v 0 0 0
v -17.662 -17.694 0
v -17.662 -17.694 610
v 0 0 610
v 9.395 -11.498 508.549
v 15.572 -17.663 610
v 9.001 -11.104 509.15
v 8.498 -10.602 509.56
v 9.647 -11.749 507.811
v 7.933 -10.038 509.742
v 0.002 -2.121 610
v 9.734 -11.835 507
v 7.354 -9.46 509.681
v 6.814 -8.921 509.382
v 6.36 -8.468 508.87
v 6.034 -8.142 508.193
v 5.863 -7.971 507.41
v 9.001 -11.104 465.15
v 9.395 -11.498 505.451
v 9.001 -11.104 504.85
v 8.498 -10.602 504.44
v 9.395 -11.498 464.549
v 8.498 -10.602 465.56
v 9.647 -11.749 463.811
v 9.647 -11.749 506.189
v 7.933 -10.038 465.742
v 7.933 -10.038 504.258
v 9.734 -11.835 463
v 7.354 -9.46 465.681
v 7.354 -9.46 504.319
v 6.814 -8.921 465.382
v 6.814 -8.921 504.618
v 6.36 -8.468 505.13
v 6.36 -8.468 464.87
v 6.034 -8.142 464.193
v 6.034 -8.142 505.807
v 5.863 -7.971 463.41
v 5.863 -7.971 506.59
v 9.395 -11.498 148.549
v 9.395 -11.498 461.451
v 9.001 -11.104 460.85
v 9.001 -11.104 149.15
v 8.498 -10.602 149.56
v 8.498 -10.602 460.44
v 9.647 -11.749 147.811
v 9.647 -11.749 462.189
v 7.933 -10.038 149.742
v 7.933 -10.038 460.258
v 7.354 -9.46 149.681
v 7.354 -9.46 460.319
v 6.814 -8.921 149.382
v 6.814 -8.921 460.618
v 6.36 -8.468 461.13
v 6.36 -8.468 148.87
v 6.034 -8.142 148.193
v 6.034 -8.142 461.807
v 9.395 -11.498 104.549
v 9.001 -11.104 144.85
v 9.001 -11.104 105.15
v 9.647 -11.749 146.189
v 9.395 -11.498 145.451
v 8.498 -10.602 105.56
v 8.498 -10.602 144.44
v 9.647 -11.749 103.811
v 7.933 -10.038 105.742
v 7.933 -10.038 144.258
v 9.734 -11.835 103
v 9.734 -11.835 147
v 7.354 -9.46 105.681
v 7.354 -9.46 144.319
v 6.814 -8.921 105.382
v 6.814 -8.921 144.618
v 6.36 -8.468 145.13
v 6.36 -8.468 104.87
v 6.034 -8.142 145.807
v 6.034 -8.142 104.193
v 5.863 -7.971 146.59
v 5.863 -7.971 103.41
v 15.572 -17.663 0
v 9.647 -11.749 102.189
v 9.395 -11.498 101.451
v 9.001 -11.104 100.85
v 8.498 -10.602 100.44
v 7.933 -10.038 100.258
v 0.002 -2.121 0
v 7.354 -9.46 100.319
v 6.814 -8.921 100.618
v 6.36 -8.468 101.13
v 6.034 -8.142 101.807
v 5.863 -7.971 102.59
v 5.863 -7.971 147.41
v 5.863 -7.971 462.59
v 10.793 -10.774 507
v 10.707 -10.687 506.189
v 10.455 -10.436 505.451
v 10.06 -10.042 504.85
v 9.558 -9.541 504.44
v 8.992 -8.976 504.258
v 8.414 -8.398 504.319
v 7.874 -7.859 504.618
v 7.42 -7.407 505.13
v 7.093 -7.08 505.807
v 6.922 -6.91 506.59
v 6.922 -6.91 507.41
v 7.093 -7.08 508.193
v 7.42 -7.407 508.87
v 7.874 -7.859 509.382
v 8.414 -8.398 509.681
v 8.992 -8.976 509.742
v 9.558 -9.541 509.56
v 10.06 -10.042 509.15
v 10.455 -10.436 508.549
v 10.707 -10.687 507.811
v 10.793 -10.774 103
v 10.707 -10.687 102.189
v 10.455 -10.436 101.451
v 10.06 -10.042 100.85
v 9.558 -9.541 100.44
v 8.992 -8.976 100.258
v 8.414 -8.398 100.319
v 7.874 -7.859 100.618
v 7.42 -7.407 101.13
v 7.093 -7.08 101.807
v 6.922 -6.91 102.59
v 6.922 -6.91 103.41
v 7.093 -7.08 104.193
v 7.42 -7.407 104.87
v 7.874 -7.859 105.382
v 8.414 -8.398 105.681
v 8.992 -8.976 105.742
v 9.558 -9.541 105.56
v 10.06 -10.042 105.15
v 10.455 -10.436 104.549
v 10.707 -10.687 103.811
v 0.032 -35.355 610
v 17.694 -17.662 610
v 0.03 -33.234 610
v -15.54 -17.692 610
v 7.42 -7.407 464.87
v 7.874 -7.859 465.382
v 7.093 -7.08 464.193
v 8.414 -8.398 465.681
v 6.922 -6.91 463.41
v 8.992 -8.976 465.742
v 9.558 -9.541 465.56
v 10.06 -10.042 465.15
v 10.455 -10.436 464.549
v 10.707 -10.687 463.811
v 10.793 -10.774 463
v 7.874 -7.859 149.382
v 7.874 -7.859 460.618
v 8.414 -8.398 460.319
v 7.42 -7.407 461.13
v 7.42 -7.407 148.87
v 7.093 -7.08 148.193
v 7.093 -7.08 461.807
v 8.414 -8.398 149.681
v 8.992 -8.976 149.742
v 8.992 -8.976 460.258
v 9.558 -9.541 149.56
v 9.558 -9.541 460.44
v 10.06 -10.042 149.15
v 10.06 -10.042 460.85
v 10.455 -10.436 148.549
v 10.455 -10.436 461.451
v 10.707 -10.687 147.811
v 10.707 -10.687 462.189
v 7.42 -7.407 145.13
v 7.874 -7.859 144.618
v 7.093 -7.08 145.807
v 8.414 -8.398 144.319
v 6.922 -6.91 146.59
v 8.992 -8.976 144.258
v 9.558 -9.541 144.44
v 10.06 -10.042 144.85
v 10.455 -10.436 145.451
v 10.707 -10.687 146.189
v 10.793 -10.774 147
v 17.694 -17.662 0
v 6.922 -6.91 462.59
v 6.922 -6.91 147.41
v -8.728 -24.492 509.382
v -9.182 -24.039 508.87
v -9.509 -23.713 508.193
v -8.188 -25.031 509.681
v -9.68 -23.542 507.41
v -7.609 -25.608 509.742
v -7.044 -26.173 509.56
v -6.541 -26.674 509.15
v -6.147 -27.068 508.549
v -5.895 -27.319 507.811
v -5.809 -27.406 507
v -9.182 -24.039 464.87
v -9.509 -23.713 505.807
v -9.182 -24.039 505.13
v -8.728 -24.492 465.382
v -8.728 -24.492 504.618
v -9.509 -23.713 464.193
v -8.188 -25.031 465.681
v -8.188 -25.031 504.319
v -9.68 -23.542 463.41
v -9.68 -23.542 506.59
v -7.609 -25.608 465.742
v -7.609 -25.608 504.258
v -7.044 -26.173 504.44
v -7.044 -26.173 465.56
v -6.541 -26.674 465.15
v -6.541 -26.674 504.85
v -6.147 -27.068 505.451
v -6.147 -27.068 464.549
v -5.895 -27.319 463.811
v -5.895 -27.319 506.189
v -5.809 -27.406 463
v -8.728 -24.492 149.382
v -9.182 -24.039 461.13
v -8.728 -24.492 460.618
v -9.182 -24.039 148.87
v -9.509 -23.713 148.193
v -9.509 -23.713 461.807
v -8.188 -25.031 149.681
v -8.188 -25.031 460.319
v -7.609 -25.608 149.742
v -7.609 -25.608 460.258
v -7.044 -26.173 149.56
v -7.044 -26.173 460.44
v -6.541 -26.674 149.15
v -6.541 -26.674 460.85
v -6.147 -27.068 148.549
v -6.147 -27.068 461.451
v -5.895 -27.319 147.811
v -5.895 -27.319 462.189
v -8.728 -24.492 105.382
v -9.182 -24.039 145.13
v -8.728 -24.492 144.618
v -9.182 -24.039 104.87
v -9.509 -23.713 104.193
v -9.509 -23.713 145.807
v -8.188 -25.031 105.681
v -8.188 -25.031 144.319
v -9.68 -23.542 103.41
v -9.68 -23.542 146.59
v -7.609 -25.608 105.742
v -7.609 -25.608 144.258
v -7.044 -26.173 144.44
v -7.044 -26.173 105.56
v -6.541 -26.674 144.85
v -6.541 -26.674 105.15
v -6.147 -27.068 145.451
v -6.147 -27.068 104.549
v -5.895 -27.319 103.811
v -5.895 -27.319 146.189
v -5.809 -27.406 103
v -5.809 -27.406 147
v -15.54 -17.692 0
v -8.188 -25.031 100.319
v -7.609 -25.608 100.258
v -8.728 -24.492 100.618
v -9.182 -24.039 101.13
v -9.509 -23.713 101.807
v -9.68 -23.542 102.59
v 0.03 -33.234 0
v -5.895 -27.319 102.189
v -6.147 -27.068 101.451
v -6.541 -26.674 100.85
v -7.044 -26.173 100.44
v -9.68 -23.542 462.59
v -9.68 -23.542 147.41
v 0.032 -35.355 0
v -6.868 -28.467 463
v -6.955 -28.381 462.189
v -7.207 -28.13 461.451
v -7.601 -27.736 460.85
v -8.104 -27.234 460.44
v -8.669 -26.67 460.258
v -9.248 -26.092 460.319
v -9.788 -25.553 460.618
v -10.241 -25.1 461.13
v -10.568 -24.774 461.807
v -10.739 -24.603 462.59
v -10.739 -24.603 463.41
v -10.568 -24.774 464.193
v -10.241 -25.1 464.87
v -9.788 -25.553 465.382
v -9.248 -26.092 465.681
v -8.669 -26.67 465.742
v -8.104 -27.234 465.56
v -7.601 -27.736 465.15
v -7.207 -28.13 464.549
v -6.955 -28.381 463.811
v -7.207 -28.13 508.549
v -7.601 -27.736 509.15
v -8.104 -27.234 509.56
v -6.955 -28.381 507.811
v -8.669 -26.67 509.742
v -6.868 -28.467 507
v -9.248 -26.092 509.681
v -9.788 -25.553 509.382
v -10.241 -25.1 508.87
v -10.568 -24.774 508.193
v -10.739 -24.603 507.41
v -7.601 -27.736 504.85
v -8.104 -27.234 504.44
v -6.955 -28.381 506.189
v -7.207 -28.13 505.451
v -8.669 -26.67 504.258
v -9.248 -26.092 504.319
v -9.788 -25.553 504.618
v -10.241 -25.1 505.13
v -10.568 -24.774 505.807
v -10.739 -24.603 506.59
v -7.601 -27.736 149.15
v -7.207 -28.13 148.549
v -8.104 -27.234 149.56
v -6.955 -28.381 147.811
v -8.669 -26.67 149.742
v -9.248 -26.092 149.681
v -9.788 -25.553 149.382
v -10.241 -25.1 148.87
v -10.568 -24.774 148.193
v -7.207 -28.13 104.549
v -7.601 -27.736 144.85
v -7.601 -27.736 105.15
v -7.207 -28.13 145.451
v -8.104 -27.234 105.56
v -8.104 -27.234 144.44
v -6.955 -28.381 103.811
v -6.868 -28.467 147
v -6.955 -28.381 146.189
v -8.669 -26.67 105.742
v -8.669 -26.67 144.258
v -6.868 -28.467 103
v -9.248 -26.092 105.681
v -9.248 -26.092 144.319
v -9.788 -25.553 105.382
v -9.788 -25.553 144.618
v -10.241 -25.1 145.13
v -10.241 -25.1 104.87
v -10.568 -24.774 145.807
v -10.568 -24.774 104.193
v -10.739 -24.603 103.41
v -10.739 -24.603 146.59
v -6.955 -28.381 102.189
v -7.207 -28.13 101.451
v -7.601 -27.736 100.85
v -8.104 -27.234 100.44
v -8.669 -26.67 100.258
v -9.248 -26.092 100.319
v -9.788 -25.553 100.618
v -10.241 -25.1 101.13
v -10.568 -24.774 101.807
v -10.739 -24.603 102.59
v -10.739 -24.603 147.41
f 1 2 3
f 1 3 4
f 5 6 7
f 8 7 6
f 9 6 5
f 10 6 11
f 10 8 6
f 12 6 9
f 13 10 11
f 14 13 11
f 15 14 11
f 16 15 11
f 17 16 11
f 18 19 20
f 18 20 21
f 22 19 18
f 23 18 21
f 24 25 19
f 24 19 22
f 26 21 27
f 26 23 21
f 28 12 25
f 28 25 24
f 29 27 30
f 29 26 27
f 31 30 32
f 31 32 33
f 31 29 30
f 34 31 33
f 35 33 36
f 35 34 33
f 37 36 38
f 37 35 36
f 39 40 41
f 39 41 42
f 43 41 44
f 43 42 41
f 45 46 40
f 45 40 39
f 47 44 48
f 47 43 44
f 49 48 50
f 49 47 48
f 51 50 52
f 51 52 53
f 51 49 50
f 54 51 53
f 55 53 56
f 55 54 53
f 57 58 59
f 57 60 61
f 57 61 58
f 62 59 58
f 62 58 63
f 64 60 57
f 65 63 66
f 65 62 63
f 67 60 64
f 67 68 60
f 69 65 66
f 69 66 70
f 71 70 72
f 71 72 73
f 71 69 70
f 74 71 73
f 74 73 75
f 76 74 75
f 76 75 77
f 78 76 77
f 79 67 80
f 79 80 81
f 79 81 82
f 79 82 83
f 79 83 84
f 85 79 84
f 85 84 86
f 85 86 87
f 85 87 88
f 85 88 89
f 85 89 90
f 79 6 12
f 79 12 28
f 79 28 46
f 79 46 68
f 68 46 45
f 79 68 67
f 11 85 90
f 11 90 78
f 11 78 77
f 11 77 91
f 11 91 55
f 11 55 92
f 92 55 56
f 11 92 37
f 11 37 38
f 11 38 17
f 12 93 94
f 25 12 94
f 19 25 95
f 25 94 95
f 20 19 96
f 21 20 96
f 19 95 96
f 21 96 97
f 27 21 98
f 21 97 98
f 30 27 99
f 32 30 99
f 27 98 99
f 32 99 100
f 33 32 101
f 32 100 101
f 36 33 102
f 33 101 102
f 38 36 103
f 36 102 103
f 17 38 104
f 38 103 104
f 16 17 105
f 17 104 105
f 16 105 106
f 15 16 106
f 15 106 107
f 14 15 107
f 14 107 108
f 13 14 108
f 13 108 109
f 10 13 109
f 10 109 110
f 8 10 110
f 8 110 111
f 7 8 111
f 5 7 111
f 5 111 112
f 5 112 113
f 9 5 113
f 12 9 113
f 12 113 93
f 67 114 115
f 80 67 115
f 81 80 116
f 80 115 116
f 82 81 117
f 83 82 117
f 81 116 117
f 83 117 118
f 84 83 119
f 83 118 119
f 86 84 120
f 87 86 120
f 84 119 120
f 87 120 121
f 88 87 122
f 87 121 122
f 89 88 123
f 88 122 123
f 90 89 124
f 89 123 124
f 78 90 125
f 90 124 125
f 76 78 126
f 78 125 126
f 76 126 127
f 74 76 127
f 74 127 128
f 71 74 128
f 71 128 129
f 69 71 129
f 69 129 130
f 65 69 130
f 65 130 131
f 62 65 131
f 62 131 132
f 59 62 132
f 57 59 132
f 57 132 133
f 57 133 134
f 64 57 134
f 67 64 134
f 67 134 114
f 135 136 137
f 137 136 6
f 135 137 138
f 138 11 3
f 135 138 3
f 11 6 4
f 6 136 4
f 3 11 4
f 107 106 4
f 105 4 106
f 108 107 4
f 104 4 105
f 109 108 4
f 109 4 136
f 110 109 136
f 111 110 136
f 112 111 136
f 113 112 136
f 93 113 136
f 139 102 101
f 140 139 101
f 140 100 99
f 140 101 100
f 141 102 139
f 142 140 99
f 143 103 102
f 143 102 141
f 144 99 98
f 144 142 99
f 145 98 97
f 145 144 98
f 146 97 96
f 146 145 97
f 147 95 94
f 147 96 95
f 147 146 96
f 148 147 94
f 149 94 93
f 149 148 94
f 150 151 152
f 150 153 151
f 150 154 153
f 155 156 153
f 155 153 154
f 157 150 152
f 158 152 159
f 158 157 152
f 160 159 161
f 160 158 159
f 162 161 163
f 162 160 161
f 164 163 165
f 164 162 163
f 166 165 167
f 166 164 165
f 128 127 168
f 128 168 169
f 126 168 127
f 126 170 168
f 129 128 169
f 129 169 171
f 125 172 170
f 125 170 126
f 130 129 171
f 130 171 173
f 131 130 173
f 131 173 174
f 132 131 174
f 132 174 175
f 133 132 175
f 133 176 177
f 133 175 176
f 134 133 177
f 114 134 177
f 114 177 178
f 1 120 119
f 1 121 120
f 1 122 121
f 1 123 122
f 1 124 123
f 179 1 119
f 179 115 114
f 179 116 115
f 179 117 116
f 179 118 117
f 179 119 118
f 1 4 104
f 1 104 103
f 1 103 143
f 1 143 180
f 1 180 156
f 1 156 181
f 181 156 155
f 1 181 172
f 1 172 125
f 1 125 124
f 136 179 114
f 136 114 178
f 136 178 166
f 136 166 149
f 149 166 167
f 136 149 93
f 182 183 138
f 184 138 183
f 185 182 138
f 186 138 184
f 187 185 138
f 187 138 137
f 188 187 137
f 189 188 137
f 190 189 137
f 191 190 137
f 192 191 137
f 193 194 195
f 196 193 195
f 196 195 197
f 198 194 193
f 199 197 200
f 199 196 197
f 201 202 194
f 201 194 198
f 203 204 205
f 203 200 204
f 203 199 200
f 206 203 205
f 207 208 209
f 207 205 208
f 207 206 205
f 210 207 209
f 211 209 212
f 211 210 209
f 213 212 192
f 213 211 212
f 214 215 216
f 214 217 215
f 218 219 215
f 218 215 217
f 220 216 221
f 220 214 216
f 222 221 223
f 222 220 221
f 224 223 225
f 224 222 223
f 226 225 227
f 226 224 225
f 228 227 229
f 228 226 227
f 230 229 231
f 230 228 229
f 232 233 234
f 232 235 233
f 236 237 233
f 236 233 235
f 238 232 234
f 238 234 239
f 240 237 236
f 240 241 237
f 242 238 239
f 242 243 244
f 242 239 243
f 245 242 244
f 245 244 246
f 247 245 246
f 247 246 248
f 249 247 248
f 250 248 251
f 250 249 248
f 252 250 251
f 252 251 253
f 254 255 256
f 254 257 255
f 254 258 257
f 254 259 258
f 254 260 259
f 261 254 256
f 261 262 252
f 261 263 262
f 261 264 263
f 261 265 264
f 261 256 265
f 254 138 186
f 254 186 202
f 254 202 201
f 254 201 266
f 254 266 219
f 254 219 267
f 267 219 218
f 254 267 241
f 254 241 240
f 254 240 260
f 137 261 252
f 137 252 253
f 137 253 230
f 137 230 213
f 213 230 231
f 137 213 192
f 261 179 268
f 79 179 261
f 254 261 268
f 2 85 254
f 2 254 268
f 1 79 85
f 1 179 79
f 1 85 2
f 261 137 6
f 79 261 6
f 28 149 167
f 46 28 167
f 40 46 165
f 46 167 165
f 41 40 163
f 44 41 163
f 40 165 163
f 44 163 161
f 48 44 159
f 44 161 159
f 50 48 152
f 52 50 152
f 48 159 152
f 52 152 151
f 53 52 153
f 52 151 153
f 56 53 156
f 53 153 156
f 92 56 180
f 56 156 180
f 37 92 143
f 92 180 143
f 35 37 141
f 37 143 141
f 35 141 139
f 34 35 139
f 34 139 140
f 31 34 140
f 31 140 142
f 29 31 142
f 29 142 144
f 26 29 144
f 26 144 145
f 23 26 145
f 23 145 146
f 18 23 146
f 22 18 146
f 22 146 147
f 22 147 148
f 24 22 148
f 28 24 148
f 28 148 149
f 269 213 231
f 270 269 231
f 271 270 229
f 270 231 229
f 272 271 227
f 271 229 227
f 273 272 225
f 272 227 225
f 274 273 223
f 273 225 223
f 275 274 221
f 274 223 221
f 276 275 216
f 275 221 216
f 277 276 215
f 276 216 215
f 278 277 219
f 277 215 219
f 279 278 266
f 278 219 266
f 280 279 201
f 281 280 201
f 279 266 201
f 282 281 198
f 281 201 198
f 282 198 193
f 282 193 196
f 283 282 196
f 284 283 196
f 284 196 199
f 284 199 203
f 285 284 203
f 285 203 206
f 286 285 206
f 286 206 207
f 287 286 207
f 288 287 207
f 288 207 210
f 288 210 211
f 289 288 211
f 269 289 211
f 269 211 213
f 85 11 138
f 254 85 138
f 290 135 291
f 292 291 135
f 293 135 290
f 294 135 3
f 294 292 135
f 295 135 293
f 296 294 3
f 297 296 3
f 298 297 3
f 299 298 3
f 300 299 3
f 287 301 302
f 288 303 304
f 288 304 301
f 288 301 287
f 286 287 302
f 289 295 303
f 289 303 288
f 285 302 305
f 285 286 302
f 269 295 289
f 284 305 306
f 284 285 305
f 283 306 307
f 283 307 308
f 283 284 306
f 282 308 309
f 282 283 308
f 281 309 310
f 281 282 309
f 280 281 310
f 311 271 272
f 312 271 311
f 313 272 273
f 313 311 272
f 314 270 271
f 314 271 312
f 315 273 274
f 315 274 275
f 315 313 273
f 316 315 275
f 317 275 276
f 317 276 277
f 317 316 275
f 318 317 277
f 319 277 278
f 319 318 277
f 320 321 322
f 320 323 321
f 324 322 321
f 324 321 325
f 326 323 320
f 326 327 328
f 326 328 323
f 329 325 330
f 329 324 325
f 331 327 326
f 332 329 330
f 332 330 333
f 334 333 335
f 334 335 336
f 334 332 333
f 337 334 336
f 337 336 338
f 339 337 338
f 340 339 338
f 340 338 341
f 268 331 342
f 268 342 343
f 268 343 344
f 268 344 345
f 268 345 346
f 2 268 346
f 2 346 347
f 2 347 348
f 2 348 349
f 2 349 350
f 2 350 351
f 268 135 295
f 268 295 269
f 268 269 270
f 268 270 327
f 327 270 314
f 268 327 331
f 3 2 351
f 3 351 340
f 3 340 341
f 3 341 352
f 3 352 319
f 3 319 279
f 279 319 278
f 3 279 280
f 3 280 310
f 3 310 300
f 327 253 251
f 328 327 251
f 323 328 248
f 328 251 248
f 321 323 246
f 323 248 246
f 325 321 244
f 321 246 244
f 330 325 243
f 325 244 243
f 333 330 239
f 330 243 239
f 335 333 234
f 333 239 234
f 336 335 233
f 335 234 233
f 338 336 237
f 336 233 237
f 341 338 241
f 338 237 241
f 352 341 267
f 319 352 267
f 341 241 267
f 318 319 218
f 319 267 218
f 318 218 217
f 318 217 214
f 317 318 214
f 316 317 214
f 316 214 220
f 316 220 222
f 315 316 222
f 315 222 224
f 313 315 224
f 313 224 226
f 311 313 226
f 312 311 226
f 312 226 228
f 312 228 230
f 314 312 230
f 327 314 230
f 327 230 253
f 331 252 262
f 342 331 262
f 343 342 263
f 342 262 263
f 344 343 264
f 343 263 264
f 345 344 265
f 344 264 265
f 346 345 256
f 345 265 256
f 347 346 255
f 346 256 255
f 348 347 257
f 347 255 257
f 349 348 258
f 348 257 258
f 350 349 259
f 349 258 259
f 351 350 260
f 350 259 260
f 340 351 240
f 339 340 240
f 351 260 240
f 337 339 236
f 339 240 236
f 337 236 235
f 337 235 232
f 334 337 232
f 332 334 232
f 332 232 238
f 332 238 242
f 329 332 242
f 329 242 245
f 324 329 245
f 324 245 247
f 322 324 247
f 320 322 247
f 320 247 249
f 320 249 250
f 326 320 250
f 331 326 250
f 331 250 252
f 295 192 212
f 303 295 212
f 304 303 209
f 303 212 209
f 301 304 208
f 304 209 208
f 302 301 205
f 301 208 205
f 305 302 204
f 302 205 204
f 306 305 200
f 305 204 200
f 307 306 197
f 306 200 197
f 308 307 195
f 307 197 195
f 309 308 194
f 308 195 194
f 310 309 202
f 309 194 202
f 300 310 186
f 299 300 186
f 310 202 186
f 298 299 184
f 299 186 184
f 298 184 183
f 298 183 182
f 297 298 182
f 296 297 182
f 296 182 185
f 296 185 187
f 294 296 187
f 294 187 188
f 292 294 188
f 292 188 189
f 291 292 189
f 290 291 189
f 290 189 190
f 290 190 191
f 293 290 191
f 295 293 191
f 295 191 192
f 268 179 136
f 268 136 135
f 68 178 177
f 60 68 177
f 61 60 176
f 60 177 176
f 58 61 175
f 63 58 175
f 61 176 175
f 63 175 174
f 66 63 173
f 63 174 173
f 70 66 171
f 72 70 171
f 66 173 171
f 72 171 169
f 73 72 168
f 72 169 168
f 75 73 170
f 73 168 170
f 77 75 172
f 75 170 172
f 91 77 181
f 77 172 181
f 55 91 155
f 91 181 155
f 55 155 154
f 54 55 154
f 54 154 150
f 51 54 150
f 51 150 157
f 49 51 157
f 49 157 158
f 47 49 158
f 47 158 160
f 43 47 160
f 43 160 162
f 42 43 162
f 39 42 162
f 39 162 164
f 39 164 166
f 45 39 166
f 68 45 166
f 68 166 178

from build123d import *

# Parameters (mm, degrees)
EXTRUDE_1_DEPTH     = 610
SKETCH_2_R          = 2.75
CUT_EXTRUDE_1_DEPTH = 38.499979182


with BuildPart() as part:
    # 草圖1 → 填料-伸長1 (new body)
    with BuildSketch(Plane.XY):
        Polygon((0, 0), (17.69379362, -17.661530719), (0.032262901, -35.355324339), (-17.661530719, -17.69379362), align=None)
        Polygon((0.001935774, -2.12131946), (-15.540211259, -17.691857846), (0.030327127, -33.234004879), (15.57247416, -17.663466493), align=None, mode=Mode.SUBTRACT)
    extrude(amount=EXTRUDE_1_DEPTH)

    # 草圖2 → 除料-伸長1 (cut, through all)
    with BuildSketch(Plane(origin=(0, 0, 0), x_dir=(0.707751745, -0.706461229, 0), z_dir=(0.706461229, 0.707751745, 0))):
        with Locations((12.5, -463)):
            Circle(SKETCH_2_R)
        with Locations((12.5, -507)):
            Circle(SKETCH_2_R)
        with Locations((12.5, -103)):
            Circle(SKETCH_2_R)
        with Locations((12.5, -147)):
            Circle(SKETCH_2_R)
    extrude(amount=-CUT_EXTRUDE_1_DEPTH, mode=Mode.SUBTRACT)


solid = part.part
